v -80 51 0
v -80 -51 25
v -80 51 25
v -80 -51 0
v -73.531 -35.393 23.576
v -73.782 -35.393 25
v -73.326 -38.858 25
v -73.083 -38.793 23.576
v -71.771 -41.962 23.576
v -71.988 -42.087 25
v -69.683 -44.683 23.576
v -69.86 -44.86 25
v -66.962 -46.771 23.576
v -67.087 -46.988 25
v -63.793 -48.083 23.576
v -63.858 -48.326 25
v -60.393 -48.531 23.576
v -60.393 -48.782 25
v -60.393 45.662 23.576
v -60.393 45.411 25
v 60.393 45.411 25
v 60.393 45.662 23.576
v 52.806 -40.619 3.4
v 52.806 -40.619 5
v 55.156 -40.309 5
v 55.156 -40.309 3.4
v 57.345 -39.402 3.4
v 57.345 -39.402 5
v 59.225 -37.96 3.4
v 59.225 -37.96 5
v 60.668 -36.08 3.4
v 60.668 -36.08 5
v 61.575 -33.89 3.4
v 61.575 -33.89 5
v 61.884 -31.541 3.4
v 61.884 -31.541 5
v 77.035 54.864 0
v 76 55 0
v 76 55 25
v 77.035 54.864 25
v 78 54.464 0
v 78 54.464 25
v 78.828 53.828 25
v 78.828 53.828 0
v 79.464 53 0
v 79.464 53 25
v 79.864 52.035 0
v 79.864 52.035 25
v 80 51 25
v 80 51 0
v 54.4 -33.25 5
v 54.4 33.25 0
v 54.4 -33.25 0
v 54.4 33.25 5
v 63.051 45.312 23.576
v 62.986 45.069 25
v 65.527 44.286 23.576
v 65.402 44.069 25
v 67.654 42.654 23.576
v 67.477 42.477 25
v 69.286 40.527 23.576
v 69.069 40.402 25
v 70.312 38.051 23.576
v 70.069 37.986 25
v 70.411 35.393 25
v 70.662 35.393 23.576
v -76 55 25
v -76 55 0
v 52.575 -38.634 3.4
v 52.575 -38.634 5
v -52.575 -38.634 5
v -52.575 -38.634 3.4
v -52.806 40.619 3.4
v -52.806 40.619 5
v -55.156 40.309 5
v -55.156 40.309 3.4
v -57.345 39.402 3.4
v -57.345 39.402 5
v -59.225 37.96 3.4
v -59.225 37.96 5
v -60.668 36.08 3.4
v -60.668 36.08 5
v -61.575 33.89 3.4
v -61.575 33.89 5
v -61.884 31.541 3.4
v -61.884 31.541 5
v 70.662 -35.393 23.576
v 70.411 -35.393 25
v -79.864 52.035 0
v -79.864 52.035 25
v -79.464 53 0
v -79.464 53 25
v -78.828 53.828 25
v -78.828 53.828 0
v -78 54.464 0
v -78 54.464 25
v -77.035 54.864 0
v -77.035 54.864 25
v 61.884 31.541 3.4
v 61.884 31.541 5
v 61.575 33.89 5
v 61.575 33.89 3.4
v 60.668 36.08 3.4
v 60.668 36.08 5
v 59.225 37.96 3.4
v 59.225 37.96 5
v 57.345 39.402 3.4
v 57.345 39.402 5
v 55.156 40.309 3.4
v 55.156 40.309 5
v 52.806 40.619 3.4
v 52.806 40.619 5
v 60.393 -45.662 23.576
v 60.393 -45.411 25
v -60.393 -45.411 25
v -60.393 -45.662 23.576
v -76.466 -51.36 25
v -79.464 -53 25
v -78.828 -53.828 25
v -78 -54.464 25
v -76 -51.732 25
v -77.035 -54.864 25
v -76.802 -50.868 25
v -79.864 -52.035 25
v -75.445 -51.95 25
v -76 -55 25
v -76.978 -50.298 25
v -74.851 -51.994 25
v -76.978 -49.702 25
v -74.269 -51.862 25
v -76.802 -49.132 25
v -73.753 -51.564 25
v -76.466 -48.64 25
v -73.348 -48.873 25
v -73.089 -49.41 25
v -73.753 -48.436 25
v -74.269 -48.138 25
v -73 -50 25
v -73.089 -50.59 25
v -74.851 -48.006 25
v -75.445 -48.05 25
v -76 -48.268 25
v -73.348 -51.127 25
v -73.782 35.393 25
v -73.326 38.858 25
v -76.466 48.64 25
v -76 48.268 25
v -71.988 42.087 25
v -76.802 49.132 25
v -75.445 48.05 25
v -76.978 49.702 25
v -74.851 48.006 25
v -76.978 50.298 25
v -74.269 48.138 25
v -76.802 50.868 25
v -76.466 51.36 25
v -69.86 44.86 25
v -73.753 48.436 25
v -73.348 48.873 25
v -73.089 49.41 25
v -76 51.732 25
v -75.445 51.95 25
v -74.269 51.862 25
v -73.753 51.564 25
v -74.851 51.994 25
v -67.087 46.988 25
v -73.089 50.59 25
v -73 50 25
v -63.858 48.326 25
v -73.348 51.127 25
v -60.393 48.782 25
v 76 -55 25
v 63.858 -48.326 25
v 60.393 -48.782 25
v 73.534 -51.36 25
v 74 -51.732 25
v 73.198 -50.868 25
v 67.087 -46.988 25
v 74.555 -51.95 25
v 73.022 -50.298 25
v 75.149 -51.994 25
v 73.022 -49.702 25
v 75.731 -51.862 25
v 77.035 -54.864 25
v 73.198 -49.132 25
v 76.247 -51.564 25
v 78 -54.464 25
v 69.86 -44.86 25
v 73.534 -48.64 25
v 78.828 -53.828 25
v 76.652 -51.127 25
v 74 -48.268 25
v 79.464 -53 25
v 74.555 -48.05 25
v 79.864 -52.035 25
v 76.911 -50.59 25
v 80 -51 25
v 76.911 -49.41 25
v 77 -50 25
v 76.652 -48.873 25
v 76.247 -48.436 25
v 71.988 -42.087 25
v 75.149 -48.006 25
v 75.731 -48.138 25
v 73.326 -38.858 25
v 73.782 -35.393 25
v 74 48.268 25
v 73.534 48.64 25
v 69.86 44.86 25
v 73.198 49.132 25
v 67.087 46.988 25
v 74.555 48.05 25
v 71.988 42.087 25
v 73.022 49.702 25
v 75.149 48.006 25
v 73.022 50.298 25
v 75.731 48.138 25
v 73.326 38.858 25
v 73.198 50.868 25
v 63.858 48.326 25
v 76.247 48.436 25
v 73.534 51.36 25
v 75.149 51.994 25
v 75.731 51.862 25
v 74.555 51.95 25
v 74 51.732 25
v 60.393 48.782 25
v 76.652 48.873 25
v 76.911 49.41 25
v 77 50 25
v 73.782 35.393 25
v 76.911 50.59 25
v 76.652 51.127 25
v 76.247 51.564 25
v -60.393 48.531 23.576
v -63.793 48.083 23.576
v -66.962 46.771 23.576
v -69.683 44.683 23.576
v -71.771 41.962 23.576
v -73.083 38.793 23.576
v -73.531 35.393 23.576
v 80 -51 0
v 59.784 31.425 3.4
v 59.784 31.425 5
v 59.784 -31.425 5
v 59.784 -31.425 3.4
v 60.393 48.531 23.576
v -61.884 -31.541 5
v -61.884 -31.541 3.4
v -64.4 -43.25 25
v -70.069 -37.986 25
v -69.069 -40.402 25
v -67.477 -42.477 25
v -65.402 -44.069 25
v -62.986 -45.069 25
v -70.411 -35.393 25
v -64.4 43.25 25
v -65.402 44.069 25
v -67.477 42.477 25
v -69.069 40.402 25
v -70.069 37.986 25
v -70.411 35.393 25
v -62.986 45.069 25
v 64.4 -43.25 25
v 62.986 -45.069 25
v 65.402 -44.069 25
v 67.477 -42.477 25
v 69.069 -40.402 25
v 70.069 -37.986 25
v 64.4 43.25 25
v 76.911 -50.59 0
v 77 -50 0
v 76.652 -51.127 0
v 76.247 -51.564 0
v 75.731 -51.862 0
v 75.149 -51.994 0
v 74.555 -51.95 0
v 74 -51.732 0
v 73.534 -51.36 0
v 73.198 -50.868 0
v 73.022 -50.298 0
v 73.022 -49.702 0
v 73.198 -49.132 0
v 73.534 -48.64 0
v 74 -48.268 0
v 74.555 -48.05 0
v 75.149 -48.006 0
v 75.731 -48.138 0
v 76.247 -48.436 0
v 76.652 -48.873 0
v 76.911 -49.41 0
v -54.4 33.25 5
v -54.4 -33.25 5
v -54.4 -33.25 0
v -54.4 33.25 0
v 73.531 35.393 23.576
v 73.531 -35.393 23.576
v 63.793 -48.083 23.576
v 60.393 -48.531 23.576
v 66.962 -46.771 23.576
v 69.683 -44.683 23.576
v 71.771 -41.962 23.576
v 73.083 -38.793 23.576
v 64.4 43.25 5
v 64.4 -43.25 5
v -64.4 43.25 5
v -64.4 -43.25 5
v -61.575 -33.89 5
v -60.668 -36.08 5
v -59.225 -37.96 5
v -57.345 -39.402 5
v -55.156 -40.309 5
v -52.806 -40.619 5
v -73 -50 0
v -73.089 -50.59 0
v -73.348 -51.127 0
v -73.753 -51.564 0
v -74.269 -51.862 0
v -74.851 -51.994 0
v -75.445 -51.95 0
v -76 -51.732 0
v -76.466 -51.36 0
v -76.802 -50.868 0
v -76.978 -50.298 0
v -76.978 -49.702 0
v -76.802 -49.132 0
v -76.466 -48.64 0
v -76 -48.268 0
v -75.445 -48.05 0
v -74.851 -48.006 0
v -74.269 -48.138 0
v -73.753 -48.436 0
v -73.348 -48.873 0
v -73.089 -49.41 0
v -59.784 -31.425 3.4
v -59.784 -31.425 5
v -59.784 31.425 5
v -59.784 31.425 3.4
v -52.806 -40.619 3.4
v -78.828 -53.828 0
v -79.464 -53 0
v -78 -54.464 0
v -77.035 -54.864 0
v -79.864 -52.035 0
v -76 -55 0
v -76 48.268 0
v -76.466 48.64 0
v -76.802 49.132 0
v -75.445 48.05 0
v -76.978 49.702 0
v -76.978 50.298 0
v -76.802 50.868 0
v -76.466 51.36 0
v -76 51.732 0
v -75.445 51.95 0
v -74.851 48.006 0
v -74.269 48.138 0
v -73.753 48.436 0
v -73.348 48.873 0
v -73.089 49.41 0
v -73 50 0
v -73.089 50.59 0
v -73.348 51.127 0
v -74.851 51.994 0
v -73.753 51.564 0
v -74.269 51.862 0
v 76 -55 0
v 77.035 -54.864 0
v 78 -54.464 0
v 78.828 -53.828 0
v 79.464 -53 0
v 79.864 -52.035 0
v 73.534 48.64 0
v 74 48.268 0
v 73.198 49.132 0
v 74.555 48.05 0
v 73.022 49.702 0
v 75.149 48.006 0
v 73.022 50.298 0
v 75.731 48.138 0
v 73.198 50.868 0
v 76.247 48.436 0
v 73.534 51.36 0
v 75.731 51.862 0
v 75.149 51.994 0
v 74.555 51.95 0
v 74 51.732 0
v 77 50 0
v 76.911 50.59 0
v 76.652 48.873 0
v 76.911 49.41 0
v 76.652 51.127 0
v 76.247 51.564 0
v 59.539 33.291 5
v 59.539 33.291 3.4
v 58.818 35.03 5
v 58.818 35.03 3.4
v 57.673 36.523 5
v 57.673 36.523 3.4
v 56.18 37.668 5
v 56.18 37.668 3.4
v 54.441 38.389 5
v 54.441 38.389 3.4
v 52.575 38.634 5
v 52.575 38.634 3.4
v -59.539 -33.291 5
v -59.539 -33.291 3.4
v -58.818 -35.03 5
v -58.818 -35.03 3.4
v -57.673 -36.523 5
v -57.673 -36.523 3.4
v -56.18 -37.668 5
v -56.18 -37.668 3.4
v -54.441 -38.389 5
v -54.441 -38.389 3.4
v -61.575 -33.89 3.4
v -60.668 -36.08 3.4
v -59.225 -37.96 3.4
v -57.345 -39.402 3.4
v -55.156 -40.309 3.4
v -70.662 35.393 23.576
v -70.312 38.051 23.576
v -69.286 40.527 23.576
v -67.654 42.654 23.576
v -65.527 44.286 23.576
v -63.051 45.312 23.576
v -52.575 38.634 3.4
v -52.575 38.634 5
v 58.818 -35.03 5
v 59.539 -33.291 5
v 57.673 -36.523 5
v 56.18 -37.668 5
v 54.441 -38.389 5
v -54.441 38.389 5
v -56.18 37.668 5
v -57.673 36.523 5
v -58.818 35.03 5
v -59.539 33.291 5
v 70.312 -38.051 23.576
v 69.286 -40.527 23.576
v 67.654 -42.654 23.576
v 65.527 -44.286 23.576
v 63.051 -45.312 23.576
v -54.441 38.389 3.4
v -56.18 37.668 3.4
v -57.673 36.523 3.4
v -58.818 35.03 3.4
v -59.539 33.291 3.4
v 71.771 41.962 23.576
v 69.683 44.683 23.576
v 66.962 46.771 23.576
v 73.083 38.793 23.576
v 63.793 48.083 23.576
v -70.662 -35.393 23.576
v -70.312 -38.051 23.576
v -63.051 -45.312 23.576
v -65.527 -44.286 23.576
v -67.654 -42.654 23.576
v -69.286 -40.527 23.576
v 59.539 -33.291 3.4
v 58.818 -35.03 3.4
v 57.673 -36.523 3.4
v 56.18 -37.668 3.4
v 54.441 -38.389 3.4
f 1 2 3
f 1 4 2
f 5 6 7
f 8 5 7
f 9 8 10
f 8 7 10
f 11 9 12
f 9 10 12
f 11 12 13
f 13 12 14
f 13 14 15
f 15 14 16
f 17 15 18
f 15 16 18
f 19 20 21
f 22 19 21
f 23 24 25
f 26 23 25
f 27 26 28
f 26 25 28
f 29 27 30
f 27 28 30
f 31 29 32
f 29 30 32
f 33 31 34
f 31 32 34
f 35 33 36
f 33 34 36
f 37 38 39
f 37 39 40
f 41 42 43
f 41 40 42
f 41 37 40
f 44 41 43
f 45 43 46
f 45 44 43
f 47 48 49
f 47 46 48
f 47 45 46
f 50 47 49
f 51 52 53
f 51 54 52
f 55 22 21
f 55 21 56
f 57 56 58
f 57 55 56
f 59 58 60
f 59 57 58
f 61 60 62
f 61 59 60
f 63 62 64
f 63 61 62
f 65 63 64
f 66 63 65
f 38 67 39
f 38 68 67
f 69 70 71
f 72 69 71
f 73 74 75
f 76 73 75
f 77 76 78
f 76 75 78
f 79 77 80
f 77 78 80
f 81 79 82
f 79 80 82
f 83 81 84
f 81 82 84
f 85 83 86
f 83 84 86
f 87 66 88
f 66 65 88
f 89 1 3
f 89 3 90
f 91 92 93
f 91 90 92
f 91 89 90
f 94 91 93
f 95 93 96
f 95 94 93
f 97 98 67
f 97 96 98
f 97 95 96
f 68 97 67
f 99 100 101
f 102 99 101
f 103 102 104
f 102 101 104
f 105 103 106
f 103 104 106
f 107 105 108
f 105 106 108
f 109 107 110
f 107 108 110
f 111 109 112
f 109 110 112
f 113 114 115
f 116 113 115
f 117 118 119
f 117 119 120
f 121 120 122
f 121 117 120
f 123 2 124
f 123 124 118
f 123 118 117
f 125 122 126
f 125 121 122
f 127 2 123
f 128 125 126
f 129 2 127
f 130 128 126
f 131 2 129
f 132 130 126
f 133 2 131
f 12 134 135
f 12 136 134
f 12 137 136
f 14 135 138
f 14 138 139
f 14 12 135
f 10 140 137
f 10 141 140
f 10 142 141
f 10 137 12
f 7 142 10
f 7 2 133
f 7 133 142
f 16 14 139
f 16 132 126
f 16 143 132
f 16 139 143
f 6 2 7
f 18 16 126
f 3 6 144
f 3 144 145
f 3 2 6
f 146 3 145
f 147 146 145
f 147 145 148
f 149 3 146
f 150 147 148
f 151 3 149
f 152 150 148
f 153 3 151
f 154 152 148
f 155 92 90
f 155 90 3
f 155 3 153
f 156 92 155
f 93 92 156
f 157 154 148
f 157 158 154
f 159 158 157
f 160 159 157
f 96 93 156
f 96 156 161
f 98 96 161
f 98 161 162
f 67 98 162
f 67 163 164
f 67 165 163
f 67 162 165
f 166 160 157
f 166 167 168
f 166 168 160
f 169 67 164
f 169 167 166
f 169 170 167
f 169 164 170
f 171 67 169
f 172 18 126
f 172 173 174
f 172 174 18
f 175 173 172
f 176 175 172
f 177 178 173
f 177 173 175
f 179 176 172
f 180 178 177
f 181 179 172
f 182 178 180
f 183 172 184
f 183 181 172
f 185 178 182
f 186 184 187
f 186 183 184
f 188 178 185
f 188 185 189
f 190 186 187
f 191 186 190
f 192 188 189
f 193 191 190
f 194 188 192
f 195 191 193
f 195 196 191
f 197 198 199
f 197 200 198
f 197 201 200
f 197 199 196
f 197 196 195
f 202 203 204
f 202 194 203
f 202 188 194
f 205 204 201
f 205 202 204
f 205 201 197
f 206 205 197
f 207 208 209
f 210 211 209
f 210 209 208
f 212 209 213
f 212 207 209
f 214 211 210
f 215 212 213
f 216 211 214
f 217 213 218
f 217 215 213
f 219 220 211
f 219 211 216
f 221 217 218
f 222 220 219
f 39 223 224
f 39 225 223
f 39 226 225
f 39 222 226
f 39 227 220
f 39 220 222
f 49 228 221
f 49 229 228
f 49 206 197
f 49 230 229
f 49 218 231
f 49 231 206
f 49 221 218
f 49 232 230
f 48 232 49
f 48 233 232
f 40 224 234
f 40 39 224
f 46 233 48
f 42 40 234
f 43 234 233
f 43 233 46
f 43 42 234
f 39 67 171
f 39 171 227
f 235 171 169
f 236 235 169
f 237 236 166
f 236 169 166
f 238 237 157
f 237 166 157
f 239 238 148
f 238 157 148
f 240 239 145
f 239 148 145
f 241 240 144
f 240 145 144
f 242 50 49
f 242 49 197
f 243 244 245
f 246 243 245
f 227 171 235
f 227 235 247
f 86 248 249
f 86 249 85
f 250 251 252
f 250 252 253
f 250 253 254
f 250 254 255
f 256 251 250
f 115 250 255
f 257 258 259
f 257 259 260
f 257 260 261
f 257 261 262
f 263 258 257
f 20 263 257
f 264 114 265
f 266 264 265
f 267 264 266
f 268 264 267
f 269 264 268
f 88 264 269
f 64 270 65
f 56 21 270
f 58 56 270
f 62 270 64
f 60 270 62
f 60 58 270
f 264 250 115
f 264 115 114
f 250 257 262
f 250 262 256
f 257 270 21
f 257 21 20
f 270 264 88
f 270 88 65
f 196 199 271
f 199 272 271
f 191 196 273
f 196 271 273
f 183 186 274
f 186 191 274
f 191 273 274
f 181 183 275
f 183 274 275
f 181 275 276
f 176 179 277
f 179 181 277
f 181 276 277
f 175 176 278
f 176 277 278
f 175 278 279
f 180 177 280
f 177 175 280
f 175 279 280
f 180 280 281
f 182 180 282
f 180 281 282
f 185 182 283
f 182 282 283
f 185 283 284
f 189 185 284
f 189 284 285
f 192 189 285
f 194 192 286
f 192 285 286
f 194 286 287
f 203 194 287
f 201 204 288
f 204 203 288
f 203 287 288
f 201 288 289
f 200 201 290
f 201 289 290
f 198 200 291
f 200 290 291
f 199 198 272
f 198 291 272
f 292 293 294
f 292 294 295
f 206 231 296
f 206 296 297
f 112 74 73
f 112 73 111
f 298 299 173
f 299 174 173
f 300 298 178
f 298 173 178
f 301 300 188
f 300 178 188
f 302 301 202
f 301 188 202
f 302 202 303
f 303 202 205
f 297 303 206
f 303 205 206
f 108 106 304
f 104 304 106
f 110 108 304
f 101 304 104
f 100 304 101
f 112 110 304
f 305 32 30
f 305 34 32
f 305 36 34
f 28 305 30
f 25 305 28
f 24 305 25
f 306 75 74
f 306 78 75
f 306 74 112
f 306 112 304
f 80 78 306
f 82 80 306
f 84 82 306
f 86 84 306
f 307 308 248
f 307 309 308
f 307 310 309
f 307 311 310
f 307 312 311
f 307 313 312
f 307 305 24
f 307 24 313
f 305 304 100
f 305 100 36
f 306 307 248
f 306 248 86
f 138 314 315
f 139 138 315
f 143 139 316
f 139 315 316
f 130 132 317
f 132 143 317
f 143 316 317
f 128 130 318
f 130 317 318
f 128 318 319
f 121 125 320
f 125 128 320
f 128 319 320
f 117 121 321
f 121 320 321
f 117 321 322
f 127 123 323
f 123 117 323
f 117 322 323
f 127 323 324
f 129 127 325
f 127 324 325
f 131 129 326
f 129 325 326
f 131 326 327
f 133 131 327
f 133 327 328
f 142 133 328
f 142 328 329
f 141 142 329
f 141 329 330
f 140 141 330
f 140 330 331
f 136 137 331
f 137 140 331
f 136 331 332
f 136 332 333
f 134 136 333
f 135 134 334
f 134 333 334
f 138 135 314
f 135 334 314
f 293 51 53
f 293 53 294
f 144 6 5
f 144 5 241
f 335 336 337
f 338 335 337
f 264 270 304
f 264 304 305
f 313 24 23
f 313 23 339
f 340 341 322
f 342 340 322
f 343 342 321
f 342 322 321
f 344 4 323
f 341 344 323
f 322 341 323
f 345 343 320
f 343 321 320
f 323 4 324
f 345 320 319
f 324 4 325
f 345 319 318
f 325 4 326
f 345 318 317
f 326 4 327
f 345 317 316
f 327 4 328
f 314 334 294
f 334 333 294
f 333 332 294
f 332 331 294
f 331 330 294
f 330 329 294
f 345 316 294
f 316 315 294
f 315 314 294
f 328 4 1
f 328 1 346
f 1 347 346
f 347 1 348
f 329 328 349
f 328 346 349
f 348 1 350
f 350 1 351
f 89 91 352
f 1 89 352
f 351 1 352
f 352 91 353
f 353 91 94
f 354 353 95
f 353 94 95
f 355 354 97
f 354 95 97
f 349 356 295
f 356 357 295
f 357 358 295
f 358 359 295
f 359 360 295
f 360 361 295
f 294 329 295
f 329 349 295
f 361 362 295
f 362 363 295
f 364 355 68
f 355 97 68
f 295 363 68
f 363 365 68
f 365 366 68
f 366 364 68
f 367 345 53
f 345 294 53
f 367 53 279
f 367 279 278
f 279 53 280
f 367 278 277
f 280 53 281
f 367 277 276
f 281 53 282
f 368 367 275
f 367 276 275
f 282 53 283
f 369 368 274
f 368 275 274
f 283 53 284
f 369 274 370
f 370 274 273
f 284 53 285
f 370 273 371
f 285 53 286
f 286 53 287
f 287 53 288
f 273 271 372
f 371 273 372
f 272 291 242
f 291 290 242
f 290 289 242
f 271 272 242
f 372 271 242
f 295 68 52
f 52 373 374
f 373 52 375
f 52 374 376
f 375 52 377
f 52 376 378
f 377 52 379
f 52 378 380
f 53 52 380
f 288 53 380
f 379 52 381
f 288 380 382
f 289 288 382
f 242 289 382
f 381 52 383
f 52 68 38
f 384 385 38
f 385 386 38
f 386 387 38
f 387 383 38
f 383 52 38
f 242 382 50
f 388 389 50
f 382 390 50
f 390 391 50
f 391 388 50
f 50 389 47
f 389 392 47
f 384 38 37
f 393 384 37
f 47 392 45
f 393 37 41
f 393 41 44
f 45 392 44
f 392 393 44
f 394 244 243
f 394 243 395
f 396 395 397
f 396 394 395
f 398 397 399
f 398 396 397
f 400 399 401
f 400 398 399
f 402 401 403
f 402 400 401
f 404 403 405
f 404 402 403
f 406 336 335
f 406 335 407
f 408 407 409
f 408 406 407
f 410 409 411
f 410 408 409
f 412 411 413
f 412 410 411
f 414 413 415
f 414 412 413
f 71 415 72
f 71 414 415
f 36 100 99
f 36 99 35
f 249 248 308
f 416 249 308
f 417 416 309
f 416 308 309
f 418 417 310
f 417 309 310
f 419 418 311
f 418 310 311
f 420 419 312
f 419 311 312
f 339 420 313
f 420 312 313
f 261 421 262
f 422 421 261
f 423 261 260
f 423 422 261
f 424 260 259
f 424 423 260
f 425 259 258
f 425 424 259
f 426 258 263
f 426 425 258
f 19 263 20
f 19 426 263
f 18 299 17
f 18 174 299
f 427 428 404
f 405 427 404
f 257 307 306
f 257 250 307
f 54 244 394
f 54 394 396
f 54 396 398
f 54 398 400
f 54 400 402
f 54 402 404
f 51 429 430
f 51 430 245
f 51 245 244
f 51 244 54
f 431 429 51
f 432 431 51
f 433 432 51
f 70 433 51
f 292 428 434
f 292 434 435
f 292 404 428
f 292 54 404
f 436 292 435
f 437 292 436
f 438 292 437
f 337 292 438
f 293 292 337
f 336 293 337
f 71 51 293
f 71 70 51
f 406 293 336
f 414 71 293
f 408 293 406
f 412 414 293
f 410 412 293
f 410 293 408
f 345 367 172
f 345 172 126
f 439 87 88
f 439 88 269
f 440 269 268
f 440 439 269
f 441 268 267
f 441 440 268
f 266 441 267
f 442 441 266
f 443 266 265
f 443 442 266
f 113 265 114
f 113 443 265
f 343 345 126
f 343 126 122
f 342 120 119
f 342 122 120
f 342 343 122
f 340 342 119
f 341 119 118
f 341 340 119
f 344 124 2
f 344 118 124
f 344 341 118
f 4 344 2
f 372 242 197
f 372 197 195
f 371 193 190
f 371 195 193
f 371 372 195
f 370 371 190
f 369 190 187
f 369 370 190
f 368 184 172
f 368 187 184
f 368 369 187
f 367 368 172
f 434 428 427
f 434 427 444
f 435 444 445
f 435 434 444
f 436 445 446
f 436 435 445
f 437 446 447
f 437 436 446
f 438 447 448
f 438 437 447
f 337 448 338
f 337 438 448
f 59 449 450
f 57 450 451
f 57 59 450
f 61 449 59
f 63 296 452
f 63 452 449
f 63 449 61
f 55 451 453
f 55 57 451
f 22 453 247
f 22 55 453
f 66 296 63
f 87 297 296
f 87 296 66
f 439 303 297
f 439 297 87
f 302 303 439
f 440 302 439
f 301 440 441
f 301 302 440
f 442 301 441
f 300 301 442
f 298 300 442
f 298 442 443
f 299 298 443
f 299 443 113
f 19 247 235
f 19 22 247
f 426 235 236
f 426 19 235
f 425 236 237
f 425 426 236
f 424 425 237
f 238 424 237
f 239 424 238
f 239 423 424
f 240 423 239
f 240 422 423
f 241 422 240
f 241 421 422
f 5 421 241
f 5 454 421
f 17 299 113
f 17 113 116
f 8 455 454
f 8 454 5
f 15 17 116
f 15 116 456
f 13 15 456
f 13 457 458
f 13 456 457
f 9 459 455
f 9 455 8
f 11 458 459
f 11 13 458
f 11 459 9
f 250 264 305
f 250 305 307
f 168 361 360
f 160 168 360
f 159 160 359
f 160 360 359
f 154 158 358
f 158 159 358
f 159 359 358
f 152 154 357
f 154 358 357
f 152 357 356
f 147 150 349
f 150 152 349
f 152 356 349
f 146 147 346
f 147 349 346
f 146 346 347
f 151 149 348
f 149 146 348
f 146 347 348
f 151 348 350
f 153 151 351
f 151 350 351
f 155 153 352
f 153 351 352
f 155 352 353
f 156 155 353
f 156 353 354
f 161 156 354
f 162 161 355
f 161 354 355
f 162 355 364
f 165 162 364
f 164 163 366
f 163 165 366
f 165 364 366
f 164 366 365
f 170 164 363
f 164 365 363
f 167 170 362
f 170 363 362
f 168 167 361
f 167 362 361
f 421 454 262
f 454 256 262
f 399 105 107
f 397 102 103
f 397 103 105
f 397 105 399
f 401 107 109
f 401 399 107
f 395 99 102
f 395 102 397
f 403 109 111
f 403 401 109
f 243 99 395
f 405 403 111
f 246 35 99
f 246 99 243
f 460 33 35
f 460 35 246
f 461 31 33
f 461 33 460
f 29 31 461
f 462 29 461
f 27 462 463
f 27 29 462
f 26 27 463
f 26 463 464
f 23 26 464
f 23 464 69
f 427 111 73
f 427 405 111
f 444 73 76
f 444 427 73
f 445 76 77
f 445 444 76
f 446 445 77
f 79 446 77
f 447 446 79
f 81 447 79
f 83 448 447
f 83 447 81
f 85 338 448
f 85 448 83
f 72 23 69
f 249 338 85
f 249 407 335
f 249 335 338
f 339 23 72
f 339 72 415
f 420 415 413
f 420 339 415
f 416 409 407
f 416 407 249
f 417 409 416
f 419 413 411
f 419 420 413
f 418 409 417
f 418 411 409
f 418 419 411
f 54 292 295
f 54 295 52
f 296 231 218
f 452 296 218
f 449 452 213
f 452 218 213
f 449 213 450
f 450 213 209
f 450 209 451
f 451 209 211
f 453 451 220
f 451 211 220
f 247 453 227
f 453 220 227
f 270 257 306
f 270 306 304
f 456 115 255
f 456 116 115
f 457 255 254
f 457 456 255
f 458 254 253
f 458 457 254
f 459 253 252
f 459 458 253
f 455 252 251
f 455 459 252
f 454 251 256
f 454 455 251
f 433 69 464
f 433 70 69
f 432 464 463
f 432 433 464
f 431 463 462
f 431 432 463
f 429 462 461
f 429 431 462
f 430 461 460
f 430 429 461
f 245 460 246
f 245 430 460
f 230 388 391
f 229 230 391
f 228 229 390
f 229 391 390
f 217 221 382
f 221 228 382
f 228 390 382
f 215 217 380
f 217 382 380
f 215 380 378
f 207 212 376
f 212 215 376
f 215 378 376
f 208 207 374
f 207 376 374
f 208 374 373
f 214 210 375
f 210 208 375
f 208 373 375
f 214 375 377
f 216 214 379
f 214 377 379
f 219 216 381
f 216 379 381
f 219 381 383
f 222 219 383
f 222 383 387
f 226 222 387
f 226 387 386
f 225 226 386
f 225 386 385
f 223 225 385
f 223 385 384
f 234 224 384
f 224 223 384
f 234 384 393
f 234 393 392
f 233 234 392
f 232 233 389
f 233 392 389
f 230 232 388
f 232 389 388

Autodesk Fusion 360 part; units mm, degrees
sketch "Sketch1" plane through (0, 0, 0) normal (0, 0, 1) x (1, 0, 0)
  line L0 (76, -55) -> (-76, -55)
  line L1 (-80, -51) -> (-80, 51)
  line L2 (-76, 55) -> (76, 55)
  line L3 (80, 51) -> (80, -51)
  line L4 (80, -55) -> (-80, 55) construction
  line L5 (-80, -55) -> (80, 55) construction
  arc A0 (-76, 55) -> (-80, 51) centre (-76, 51) ccw
  arc A1 (80, 51) -> (76, 55) centre (76, 51) ccw
  arc A2 (76, -55) -> (80, -51) centre (76, -51) ccw
  arc A3 (-80, -51) -> (-76, -55) centre (-76, -51) ccw
  circle A4 centre (-75, 50) radius 2
  line L6 (0, 55) -> (0, -55) construction
  line L7 (80, 0) -> (-80, 0) construction
  circle A5 centre (75, 50) radius 2
  circle A6 centre (75, -50) radius 2
  circle A7 centre (-75, -50) radius 2
  dimension "d1" = 160
  dimension "d2" = 110
  dimension "d26" = 4
  dimension "d27" = 4
  dimension "d28" = 4
  dimension "d29" = 4
  dimension "d30" = 4
  dimension "d31" = 5
  dimension "d32" = 5
extrude "Extrude1" add sketch "Sketch1" along normal blind 25
sketch "Sketch2" plane through (0, 0, 25) normal (0, 0, 1) x (-1, 0, 0)
  line L0 (-76, -55) -> (76, -55)
  line L1 (80, -51) -> (80, 51)
  line L2 (76, 55) -> (-76, 55)
  line L3 (-80, 51) -> (-80, -51)
  line L4 (-64.4, 43.25) -> (64.4, 43.25)
  line L5 (64.4, 43.25) -> (64.4, -43.25)
  line L6 (64.4, -43.25) -> (-64.4, -43.25)
  line L7 (-64.4, -43.25) -> (-64.4, 43.25)
  line L8 (-64.4, 43.25) -> (64.4, -43.25) construction
  line L9 (64.4, 43.25) -> (-64.4, -43.25) construction
  arc A0 (76, -55) -> (80, -51) centre (76, -51) ccw
  arc A1 (80, 51) -> (76, 55) centre (76, 51) ccw
  arc A2 (-76, 55) -> (-80, 51) centre (-76, 51) ccw
  arc A3 (-80, -51) -> (-76, -55) centre (-76, -51) ccw
  circle A4 centre (75, 50) radius 2
  circle A5 centre (-75, 50) radius 2
  circle A6 centre (-75, -50) radius 2
  circle A7 centre (75, -50) radius 2
  dimension "d5" = 128.8
  dimension "d6" = 86.5
extrude "Extrude2" cut sketch "Sketch2" against normal blind 20 contours L4 L5 L6 L7
sketch "Sketch3" plane through (0, 0, 25) normal (0, 0, 1) x (-1, 0, 0)
  line L0 (64.4, 43.25) -> (64.4, -43.25)
  line L1 (64.4, -43.25) -> (-64.4, -43.25)
  line L2 (-64.4, -43.25) -> (-64.4, 43.25)
  line L3 (-64.4, 43.25) -> (64.4, 43.25)
  line L4 (-76, -55) -> (76, -55)
  line L5 (80, -51) -> (80, 51)
  line L6 (76, 55) -> (-76, 55)
  line L7 (-80, 51) -> (-80, -51)
  line L8 (-72.0964, 47.0964) -> (72.0964, 47.0964) construction
  line L9 (72.0964, 47.0964) -> (72.0964, -47.0964) construction
  line L10 (72.0964, -47.0964) -> (-72.0964, -47.0964) construction
  line L11 (-72.0964, -47.0964) -> (-72.0964, 47.0964) construction
  line L12 (-72.0964, 47.0964) -> (72.0964, -47.0964) construction
  line L13 (72.0964, 47.0964) -> (-72.0964, -47.0964) construction
  line L14 (70.6619, 35.3929) -> (70.6619, -35.3929)
  line L15 (60.3929, -45.6619) -> (-60.3929, -45.6619)
  line L16 (-70.6619, -35.3929) -> (-70.6619, 35.3929)
  line L17 (-70.6619, 45.6619) -> (70.6619, -45.6619) construction
  line L18 (70.6619, 45.6619) -> (-70.6619, -45.6619) construction
  line L19 (-60.3929, 48.5309) -> (60.3929, 48.5309)
  line L20 (73.5309, 35.3929) -> (73.5309, -35.3929)
  line L21 (60.3929, -48.5309) -> (-60.3929, -48.5309)
  line L22 (-73.5309, -35.3929) -> (-73.5309, 35.3929)
  line L23 (-73.5309, 48.5309) -> (73.5309, -48.5309) construction
  line L24 (73.5309, 48.5309) -> (-73.5309, -48.5309) construction
  arc A0 (60.3929, -45.6619) -> (70.6619, -35.3929) centre (60.3929, -35.3929) ccw
  arc A1 (60.3929, -48.5309) -> (73.5309, -35.3929) centre (60.3929, -35.3929) ccw
  line L25 (0, -55) -> (0, 55) construction
  line L26 (-80, 0) -> (80, 0) construction
  arc A2 (-70.6619, -35.3929) -> (-60.3929, -45.6619) centre (-60.3929, -35.3929) ccw
  arc A3 (-73.5309, -35.3929) -> (-60.3929, -48.5309) centre (-60.3929, -35.3929) ccw
  arc A4 (-60.3929, 45.6619) -> (-70.6619, 35.3929) centre (-60.3929, 35.3929) ccw
  arc A5 (-60.3929, 48.5309) -> (-73.5309, 35.3929) centre (-60.3929, 35.3929) ccw
  arc A6 (70.6619, 35.3929) -> (60.3929, 45.6619) centre (60.3929, 35.3929) ccw
  arc A7 (73.5309, 35.3929) -> (60.3929, 48.5309) centre (60.3929, 35.3929) ccw
  line L27 (-60.3929, 45.6619) -> (60.3929, 45.6619)
  arc A8 (76, -55) -> (80, -51) centre (76, -51) ccw
  arc A9 (80, 51) -> (76, 55) centre (76, 51) ccw
  arc A10 (-76, 55) -> (-80, 51) centre (-76, 51) ccw
  arc A11 (-80, -51) -> (-76, -55) centre (-76, -51) ccw
  circle A12 centre (75, 50) radius 2
  circle A13 centre (-75, 50) radius 2
  circle A14 centre (-75, -50) radius 2
  circle A15 centre (75, -50) radius 2
  dimension "d9" = 144.1928
  dimension "d15" = 94.1928
  dimension "d16" = 1.4345
  dimension "d17" = 1.4345
  dimension "d18" = 1.4345
  dimension "d19" = 1.4345
  dimension "d20" = 10.269
  dimension "d21" = 13.138
extrude "Extrude3" cut sketch "Sketch3" against normal blind 1.424 contours L19 L20 L21 L22 A1 A3 A5 A7
draft "Draft1" angle 10 neutral plane through (0, 0, 23.576) pull (0, 0, 1) 16 faces at (-70.6619, -11.7976, 24.5253) (-67.8249, 42.4793, 24.0507) (-20.131, 45.6619, 24.5253) (67.4793, 42.8249, 24.0507) (70.6619, 11.7976, 24.5253) (67.8249, -42.4793, 24.0507) (20.131, -45.6619, 24.5253) (-64.2095, -44.9263, 24.5253) (-73.5309, -11.7976, 24.5253) (-70.7201, -43.5143, 24.0507) (20.131, -48.5309, 24.5253) (68.5143, -45.7201, 24.0507) (73.5309, 11.7976, 24.5253) (70.7201, 43.5143, 24.0507) (-20.131, 48.5309, 24.5253) (-71.0948, 43.0137, 24.0507)
sketch "Sketch4" plane through (0, 0, 5) normal (0, 0, 1) x (-1, 0, 0)
  line L0 (-64.4, -43.25) -> (64.4, -43.25)
  line L1 (64.4, -43.25) -> (64.4, 43.25)
  line L2 (64.4, 43.25) -> (-64.4, 43.25)
  line L3 (-64.4, 43.25) -> (-64.4, -43.25)
  line L4 (-54.4, 33.25) -> (54.4, 33.25)
  line L5 (54.4, 33.25) -> (54.4, -33.25)
  line L6 (54.4, -33.25) -> (-54.4, -33.25)
  line L7 (-54.4, -33.25) -> (-54.4, 33.25)
  line L8 (-54.4, 33.25) -> (54.4, -33.25) construction
  line L9 (54.4, 33.25) -> (-54.4, -33.25) construction
  dimension "d35" = 10
  dimension "d36" = 10
extrude "Extrude4" cut sketch "Sketch4" against normal blind 5 contours L4 L5 L6 L7
sketch "Sketch5" plane through (0, 0, 5) normal (0, 0, 1) x (-1, 0, 0)
  line L0 (54.4, 33.25) -> (54.4, -33.25)
  line L1 (54.4, -33.25) -> (-54.4, -33.25)
  line L2 (-54.4, -33.25) -> (-54.4, 33.25)
  line L3 (-54.4, 33.25) -> (54.4, 33.25)
  line L4 (-64.4, -43.25) -> (64.4, -43.25)
  line L5 (64.4, -43.25) -> (64.4, 43.25)
  line L6 (64.4, 43.25) -> (-64.4, 43.25)
  line L7 (-64.4, 43.25) -> (-64.4, -43.25)
  line L8 (-60.8342, 39.6842) -> (60.8342, 39.6842) construction
  line L9 (60.8342, 39.6842) -> (60.8342, -39.6842) construction
  line L10 (60.8342, -39.6842) -> (-60.8342, -39.6842) construction
  line L11 (-60.8342, -39.6842) -> (-60.8342, 39.6842) construction
  line L12 (-60.8342, 39.6842) -> (60.8342, -39.6842) construction
  line L13 (60.8342, 39.6842) -> (-60.8342, -39.6842) construction
  line L14 (59.7842, 31.4252) -> (59.7842, -31.4252)
  line L15 (52.5752, -38.6342) -> (-52.5752, -38.6342)
  line L16 (-59.7842, -31.4252) -> (-59.7842, 31.4252)
  line L17 (-57.1085, 36.9051) -> (59.7842, -38.6342) construction
  line L18 (57.4574, 36.3074) -> (-57.4574, -36.3074) construction
  line L19 (-52.8062, 40.6187) -> (52.8062, 40.6187)
  line L20 (61.8842, 31.5407) -> (61.8842, -31.5407)
  line L21 (52.8062, -40.6187) -> (-52.8062, -40.6187)
  line L22 (-61.8842, -31.5407) -> (-61.8842, 31.5407)
  line L23 (-58.9962, 38.7231) -> (61.8842, -40.6187) construction
  line L24 (59.3264, 38.1764) -> (-59.3264, -38.1764) construction
  arc A0 (52.5752, -38.6342) -> (59.7842, -31.4252) centre (52.5752, -31.4252) ccw
  arc A1 (52.8062, -40.6187) -> (61.8842, -31.5407) centre (52.8062, -31.5407) ccw
  line L25 (0, -43.25) -> (0, 43.25) construction
  line L26 (-64.4, 0) -> (64.4, 0) construction
  arc A2 (-59.7842, -31.4252) -> (-52.5752, -38.6342) centre (-52.5752, -31.4252) ccw
  arc A3 (-61.8842, -31.5407) -> (-52.8062, -40.6187) centre (-52.8062, -31.5407) ccw
  arc A4 (59.7842, 31.4252) -> (52.5752, 38.6342) centre (52.5752, 31.4252) ccw
  arc A5 (61.8842, 31.5407) -> (52.8062, 40.6187) centre (52.8062, 31.5407) ccw
  arc A6 (-52.5752, 38.6342) -> (-59.7842, 31.4252) centre (-52.5752, 31.4252) ccw
  arc A7 (-52.8062, 40.6187) -> (-61.8842, 31.5407) centre (-52.8062, 31.5407) ccw
  line L27 (-52.5752, 38.6342) -> (52.5752, 38.6342)
  dimension "d42" = 121.6684
  dimension "d43" = 79.3684
  dimension "d44" = 1.05
  dimension "d45" = 0.9345
  dimension "d46" = 1.05
  dimension "d47" = 1.05
  dimension "d48" = 7.209
  dimension "d49" = 9.078
extrude "Extrude5" cut sketch "Sketch5" against normal blind 1.6 contours L19 L20 L21 L22 A1 A3 A5 A7
equation "d9 = ( ORingPerimeter - 100 mm ) / 4 + 50 mm"
equation "ORingDiameter = 1.78 mm" comment "Diamter of the O ring"
equation "ORingInnerDiameter = 150 mm" comment "Inner diamter of the o ring bore"
equation "ORingPerimeter = 2 * 3.1412 * ( ( ORingInnerDiameter / 2 ) + ORingDiameter / 2 )"
equation "PanelWidth = 80 mm"
equation "PanelLength = 115 mm"
equation "d15 = ( ORingPerimeter - 100 mm ) / 4"
equation "d16 = ( ( ORingDiameter * 1.05 ) / 2 ) + 0.5 mm"
equation "d17 = ( ( ORingDiameter * 1.05 ) / 2 ) + 0.5 mm"
equation "d18 = ( ( ORingDiameter * 1.05 ) / 2 ) + 0.5 mm"
equation "d19 = ( ( ORingDiameter * 1.05 ) / 2 ) + 0.5 mm"
equation "d20 = ( ORingDiameter ) * 6 + ORingDiameter * 0.05 - 0.5 mm"
equation "d21 = ( ORingDiameter ) * 6 + ( ORingDiameter * 1.1 ) + 0.5 mm"
equation "d22 = -ORingDiameter * 0.8"
equation "ORing2Diameter = 2 mm" comment "Second O ring Diameter"
equation "ORing2InnerDiameter = 126 mm" comment "Inner diameter of the second O Ring"
equation "ORing2Perimeter = 2 * 3.1412 * ( ( ORing2InnerDiameter / 2 ) + ORing2Diameter / 2 )"
equation "d42 = ( ORing2Perimeter - 84.6 mm ) / 4 + 42.3 mm"
equation "d43 = ( ORing2Perimeter - 84.6 mm ) / 4"
equation "d44 = ( ORing2Diameter * 1.05 ) / 2"
equation "d45 = ( ORingDiameter * 1.05 ) / 2"
equation "d46 = ( ORing2Diameter * 1.05 ) / 2"
equation "d47 = ( ORing2Diameter * 1.05 ) / 2"
equation "d48 = ( ORingDiameter ) * 4 + ORingDiameter * 0.05 - 0.0 mm"
equation "d49 = ( ORingDiameter ) * 4 + ORingDiameter * 1.1 + 0 mm"
equation "d50 = -ORing2Diameter * 0.8"
